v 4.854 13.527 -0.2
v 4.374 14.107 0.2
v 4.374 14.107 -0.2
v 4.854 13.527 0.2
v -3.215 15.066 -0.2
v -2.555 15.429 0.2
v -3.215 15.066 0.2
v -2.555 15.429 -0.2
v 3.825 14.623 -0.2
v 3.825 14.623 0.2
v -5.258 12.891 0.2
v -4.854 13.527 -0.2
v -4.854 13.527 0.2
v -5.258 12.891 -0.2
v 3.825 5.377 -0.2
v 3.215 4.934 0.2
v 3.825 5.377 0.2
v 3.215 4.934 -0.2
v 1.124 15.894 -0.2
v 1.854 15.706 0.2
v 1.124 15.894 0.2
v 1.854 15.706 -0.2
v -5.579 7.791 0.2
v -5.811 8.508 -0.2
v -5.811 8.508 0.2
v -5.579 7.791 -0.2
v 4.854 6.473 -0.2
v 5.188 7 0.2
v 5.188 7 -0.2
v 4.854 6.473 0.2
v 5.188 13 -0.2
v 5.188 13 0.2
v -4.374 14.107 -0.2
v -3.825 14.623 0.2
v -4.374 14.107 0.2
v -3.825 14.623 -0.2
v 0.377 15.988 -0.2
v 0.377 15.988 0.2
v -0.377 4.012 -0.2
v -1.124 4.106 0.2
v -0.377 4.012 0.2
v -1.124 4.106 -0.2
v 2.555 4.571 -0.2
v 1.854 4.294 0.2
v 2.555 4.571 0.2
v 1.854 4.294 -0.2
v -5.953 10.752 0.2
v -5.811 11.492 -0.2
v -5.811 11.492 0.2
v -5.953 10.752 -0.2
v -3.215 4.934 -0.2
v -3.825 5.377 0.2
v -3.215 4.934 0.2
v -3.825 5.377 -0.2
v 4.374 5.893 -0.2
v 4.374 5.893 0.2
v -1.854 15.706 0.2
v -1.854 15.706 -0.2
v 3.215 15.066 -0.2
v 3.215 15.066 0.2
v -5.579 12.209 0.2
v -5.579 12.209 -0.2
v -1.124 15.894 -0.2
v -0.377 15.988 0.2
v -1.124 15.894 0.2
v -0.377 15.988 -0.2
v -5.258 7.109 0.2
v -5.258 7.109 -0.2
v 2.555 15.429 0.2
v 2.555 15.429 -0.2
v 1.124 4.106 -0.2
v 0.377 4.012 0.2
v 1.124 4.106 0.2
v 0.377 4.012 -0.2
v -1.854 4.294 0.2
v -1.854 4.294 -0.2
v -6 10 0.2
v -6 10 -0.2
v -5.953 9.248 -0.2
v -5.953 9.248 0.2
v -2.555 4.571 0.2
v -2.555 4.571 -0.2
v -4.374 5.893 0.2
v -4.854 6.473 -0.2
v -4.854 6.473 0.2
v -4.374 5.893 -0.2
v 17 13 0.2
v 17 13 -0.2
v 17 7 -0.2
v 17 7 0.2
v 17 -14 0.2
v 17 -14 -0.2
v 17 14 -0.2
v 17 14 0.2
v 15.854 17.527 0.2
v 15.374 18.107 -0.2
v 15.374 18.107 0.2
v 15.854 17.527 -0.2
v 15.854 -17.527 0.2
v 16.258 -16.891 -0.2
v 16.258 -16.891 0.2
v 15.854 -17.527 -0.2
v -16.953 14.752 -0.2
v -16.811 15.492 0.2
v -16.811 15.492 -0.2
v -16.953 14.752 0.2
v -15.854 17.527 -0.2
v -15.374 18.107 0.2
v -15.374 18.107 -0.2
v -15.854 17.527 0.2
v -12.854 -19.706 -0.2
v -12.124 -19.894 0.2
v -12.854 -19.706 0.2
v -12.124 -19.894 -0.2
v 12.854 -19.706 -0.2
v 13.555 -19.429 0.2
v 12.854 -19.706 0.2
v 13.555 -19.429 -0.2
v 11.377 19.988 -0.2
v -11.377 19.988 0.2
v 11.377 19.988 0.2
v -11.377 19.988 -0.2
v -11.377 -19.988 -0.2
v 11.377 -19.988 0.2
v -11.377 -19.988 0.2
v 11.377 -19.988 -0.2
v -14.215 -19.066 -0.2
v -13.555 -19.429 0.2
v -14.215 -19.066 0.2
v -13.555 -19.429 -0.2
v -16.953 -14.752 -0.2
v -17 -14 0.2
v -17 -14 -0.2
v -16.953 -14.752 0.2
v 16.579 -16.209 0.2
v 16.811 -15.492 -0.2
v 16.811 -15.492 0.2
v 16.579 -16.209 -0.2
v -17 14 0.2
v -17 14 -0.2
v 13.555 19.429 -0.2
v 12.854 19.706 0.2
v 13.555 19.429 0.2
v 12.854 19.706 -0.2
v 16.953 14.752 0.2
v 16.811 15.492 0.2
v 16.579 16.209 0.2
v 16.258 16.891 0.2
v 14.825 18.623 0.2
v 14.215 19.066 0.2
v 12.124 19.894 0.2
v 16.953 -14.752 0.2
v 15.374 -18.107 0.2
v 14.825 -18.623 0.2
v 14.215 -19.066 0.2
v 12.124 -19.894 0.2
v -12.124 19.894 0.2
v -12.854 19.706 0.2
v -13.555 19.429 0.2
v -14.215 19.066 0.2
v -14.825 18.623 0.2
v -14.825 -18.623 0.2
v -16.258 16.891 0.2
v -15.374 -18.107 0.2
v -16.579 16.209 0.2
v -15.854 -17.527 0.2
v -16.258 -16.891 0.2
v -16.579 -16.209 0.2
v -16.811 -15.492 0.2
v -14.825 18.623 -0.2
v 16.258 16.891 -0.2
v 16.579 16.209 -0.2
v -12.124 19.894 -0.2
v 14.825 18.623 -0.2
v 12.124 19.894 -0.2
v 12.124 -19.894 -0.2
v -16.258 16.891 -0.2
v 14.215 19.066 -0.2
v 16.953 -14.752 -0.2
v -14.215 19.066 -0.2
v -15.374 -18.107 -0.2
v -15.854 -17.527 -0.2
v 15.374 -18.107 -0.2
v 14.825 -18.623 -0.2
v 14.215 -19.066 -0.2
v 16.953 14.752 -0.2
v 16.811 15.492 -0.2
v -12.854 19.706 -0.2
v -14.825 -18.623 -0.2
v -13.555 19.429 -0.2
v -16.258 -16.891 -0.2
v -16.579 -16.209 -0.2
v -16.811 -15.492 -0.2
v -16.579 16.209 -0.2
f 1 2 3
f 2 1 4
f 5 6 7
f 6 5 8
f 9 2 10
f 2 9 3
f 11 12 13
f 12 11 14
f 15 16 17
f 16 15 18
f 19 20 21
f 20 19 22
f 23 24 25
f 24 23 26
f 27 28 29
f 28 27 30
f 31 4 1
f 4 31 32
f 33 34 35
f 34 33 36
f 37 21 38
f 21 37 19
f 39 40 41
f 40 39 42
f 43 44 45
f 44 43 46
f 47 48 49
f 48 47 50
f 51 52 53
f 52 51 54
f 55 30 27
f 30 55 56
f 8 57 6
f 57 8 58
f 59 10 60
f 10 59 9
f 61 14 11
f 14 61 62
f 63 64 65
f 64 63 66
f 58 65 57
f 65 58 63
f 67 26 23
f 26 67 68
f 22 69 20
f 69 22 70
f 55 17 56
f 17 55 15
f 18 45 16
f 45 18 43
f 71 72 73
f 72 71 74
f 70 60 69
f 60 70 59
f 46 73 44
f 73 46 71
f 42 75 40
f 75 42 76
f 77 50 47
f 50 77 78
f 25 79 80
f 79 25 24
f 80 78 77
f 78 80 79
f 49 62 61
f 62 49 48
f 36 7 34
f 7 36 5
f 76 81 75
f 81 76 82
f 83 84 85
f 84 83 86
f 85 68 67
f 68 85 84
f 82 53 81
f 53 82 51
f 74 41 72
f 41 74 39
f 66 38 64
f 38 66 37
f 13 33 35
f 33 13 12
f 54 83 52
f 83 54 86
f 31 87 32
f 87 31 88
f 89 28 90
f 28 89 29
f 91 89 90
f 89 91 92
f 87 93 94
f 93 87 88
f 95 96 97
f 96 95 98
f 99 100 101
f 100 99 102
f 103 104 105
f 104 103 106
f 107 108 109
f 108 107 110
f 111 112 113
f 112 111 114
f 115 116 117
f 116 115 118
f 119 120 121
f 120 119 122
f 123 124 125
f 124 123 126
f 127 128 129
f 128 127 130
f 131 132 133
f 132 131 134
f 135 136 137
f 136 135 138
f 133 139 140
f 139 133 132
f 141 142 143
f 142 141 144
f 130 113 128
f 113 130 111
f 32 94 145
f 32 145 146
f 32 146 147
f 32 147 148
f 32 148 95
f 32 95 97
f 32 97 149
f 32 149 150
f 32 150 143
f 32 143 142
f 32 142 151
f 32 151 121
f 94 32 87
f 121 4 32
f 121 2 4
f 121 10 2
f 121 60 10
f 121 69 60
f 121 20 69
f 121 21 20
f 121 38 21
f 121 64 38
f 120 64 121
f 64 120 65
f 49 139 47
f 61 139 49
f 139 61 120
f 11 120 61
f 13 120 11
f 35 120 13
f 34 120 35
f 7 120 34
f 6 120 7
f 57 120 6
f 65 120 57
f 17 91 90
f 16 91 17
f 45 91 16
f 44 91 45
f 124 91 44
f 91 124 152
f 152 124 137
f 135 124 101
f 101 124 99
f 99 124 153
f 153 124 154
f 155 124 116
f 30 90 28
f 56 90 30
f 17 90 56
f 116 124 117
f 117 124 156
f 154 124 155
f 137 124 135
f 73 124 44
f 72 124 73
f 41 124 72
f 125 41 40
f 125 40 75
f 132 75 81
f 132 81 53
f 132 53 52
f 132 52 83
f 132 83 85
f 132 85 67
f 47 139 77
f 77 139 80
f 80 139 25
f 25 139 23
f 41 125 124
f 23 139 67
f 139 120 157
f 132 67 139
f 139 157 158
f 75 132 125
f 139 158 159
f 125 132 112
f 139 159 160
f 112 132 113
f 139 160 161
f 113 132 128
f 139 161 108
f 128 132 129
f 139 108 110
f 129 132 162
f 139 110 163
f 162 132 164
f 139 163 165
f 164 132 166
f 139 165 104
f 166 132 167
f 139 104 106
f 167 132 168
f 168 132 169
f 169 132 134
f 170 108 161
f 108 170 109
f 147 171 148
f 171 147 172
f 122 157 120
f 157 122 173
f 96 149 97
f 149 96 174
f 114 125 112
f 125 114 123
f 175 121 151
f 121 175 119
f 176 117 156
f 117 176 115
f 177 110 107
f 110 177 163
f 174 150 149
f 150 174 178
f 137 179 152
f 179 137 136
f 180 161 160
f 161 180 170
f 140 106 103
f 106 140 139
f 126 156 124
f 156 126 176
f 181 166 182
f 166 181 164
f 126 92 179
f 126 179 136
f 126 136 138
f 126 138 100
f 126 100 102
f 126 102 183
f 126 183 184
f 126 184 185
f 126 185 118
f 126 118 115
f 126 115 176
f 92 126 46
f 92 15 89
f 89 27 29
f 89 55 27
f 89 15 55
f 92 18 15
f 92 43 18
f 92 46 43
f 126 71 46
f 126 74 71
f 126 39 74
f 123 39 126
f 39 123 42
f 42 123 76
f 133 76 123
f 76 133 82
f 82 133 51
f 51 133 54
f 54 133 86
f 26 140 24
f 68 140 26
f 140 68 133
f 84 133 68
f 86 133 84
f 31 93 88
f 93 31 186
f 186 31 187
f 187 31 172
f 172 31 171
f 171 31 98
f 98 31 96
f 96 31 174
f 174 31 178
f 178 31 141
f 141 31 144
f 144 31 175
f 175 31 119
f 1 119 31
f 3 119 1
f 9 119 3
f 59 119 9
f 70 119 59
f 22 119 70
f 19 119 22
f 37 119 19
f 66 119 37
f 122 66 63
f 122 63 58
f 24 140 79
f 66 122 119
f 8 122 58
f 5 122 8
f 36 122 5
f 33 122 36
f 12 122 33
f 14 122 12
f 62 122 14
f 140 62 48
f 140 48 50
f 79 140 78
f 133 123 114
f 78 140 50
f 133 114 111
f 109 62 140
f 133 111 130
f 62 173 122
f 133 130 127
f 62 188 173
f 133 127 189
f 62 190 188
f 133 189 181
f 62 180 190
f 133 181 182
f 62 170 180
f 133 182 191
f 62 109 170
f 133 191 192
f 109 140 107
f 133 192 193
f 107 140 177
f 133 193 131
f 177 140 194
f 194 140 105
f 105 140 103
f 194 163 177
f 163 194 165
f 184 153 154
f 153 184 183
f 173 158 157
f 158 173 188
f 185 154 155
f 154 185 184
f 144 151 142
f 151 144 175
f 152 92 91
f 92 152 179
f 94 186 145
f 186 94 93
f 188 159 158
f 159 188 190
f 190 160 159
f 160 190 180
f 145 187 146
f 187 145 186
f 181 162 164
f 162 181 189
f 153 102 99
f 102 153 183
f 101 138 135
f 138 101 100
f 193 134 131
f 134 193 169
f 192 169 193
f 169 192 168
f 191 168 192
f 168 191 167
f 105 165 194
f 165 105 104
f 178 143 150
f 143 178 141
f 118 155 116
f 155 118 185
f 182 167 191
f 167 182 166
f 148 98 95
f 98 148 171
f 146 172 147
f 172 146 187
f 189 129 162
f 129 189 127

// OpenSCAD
//Hang tab dimensions
tab_height = 40;
tab_width = 34;
tab_thickness = 0.4;

hole_diameter = 12;
hole_offset = 10;

rounding_radius = 6;

add_slot = 1; // [1,0]

// number of fragments (how round)
$fn=50;

height = tab_height - 2*rounding_radius;
width = tab_width - 2*rounding_radius;
difference(){
    minkowski(){
        cube([width, height, tab_thickness/2],center = true);
        cylinder(r=rounding_radius, tab_thickness/2,center=true);
    }
    translate([0,hole_offset,0]) {
        cylinder(d=hole_diameter,h=tab_thickness*2,center = true);
        if(add_slot) {
            translate([width/2,0,0])
                cube(center=true,size=[width,hole_diameter/2,tab_thickness*2]);
        }
    }
}
